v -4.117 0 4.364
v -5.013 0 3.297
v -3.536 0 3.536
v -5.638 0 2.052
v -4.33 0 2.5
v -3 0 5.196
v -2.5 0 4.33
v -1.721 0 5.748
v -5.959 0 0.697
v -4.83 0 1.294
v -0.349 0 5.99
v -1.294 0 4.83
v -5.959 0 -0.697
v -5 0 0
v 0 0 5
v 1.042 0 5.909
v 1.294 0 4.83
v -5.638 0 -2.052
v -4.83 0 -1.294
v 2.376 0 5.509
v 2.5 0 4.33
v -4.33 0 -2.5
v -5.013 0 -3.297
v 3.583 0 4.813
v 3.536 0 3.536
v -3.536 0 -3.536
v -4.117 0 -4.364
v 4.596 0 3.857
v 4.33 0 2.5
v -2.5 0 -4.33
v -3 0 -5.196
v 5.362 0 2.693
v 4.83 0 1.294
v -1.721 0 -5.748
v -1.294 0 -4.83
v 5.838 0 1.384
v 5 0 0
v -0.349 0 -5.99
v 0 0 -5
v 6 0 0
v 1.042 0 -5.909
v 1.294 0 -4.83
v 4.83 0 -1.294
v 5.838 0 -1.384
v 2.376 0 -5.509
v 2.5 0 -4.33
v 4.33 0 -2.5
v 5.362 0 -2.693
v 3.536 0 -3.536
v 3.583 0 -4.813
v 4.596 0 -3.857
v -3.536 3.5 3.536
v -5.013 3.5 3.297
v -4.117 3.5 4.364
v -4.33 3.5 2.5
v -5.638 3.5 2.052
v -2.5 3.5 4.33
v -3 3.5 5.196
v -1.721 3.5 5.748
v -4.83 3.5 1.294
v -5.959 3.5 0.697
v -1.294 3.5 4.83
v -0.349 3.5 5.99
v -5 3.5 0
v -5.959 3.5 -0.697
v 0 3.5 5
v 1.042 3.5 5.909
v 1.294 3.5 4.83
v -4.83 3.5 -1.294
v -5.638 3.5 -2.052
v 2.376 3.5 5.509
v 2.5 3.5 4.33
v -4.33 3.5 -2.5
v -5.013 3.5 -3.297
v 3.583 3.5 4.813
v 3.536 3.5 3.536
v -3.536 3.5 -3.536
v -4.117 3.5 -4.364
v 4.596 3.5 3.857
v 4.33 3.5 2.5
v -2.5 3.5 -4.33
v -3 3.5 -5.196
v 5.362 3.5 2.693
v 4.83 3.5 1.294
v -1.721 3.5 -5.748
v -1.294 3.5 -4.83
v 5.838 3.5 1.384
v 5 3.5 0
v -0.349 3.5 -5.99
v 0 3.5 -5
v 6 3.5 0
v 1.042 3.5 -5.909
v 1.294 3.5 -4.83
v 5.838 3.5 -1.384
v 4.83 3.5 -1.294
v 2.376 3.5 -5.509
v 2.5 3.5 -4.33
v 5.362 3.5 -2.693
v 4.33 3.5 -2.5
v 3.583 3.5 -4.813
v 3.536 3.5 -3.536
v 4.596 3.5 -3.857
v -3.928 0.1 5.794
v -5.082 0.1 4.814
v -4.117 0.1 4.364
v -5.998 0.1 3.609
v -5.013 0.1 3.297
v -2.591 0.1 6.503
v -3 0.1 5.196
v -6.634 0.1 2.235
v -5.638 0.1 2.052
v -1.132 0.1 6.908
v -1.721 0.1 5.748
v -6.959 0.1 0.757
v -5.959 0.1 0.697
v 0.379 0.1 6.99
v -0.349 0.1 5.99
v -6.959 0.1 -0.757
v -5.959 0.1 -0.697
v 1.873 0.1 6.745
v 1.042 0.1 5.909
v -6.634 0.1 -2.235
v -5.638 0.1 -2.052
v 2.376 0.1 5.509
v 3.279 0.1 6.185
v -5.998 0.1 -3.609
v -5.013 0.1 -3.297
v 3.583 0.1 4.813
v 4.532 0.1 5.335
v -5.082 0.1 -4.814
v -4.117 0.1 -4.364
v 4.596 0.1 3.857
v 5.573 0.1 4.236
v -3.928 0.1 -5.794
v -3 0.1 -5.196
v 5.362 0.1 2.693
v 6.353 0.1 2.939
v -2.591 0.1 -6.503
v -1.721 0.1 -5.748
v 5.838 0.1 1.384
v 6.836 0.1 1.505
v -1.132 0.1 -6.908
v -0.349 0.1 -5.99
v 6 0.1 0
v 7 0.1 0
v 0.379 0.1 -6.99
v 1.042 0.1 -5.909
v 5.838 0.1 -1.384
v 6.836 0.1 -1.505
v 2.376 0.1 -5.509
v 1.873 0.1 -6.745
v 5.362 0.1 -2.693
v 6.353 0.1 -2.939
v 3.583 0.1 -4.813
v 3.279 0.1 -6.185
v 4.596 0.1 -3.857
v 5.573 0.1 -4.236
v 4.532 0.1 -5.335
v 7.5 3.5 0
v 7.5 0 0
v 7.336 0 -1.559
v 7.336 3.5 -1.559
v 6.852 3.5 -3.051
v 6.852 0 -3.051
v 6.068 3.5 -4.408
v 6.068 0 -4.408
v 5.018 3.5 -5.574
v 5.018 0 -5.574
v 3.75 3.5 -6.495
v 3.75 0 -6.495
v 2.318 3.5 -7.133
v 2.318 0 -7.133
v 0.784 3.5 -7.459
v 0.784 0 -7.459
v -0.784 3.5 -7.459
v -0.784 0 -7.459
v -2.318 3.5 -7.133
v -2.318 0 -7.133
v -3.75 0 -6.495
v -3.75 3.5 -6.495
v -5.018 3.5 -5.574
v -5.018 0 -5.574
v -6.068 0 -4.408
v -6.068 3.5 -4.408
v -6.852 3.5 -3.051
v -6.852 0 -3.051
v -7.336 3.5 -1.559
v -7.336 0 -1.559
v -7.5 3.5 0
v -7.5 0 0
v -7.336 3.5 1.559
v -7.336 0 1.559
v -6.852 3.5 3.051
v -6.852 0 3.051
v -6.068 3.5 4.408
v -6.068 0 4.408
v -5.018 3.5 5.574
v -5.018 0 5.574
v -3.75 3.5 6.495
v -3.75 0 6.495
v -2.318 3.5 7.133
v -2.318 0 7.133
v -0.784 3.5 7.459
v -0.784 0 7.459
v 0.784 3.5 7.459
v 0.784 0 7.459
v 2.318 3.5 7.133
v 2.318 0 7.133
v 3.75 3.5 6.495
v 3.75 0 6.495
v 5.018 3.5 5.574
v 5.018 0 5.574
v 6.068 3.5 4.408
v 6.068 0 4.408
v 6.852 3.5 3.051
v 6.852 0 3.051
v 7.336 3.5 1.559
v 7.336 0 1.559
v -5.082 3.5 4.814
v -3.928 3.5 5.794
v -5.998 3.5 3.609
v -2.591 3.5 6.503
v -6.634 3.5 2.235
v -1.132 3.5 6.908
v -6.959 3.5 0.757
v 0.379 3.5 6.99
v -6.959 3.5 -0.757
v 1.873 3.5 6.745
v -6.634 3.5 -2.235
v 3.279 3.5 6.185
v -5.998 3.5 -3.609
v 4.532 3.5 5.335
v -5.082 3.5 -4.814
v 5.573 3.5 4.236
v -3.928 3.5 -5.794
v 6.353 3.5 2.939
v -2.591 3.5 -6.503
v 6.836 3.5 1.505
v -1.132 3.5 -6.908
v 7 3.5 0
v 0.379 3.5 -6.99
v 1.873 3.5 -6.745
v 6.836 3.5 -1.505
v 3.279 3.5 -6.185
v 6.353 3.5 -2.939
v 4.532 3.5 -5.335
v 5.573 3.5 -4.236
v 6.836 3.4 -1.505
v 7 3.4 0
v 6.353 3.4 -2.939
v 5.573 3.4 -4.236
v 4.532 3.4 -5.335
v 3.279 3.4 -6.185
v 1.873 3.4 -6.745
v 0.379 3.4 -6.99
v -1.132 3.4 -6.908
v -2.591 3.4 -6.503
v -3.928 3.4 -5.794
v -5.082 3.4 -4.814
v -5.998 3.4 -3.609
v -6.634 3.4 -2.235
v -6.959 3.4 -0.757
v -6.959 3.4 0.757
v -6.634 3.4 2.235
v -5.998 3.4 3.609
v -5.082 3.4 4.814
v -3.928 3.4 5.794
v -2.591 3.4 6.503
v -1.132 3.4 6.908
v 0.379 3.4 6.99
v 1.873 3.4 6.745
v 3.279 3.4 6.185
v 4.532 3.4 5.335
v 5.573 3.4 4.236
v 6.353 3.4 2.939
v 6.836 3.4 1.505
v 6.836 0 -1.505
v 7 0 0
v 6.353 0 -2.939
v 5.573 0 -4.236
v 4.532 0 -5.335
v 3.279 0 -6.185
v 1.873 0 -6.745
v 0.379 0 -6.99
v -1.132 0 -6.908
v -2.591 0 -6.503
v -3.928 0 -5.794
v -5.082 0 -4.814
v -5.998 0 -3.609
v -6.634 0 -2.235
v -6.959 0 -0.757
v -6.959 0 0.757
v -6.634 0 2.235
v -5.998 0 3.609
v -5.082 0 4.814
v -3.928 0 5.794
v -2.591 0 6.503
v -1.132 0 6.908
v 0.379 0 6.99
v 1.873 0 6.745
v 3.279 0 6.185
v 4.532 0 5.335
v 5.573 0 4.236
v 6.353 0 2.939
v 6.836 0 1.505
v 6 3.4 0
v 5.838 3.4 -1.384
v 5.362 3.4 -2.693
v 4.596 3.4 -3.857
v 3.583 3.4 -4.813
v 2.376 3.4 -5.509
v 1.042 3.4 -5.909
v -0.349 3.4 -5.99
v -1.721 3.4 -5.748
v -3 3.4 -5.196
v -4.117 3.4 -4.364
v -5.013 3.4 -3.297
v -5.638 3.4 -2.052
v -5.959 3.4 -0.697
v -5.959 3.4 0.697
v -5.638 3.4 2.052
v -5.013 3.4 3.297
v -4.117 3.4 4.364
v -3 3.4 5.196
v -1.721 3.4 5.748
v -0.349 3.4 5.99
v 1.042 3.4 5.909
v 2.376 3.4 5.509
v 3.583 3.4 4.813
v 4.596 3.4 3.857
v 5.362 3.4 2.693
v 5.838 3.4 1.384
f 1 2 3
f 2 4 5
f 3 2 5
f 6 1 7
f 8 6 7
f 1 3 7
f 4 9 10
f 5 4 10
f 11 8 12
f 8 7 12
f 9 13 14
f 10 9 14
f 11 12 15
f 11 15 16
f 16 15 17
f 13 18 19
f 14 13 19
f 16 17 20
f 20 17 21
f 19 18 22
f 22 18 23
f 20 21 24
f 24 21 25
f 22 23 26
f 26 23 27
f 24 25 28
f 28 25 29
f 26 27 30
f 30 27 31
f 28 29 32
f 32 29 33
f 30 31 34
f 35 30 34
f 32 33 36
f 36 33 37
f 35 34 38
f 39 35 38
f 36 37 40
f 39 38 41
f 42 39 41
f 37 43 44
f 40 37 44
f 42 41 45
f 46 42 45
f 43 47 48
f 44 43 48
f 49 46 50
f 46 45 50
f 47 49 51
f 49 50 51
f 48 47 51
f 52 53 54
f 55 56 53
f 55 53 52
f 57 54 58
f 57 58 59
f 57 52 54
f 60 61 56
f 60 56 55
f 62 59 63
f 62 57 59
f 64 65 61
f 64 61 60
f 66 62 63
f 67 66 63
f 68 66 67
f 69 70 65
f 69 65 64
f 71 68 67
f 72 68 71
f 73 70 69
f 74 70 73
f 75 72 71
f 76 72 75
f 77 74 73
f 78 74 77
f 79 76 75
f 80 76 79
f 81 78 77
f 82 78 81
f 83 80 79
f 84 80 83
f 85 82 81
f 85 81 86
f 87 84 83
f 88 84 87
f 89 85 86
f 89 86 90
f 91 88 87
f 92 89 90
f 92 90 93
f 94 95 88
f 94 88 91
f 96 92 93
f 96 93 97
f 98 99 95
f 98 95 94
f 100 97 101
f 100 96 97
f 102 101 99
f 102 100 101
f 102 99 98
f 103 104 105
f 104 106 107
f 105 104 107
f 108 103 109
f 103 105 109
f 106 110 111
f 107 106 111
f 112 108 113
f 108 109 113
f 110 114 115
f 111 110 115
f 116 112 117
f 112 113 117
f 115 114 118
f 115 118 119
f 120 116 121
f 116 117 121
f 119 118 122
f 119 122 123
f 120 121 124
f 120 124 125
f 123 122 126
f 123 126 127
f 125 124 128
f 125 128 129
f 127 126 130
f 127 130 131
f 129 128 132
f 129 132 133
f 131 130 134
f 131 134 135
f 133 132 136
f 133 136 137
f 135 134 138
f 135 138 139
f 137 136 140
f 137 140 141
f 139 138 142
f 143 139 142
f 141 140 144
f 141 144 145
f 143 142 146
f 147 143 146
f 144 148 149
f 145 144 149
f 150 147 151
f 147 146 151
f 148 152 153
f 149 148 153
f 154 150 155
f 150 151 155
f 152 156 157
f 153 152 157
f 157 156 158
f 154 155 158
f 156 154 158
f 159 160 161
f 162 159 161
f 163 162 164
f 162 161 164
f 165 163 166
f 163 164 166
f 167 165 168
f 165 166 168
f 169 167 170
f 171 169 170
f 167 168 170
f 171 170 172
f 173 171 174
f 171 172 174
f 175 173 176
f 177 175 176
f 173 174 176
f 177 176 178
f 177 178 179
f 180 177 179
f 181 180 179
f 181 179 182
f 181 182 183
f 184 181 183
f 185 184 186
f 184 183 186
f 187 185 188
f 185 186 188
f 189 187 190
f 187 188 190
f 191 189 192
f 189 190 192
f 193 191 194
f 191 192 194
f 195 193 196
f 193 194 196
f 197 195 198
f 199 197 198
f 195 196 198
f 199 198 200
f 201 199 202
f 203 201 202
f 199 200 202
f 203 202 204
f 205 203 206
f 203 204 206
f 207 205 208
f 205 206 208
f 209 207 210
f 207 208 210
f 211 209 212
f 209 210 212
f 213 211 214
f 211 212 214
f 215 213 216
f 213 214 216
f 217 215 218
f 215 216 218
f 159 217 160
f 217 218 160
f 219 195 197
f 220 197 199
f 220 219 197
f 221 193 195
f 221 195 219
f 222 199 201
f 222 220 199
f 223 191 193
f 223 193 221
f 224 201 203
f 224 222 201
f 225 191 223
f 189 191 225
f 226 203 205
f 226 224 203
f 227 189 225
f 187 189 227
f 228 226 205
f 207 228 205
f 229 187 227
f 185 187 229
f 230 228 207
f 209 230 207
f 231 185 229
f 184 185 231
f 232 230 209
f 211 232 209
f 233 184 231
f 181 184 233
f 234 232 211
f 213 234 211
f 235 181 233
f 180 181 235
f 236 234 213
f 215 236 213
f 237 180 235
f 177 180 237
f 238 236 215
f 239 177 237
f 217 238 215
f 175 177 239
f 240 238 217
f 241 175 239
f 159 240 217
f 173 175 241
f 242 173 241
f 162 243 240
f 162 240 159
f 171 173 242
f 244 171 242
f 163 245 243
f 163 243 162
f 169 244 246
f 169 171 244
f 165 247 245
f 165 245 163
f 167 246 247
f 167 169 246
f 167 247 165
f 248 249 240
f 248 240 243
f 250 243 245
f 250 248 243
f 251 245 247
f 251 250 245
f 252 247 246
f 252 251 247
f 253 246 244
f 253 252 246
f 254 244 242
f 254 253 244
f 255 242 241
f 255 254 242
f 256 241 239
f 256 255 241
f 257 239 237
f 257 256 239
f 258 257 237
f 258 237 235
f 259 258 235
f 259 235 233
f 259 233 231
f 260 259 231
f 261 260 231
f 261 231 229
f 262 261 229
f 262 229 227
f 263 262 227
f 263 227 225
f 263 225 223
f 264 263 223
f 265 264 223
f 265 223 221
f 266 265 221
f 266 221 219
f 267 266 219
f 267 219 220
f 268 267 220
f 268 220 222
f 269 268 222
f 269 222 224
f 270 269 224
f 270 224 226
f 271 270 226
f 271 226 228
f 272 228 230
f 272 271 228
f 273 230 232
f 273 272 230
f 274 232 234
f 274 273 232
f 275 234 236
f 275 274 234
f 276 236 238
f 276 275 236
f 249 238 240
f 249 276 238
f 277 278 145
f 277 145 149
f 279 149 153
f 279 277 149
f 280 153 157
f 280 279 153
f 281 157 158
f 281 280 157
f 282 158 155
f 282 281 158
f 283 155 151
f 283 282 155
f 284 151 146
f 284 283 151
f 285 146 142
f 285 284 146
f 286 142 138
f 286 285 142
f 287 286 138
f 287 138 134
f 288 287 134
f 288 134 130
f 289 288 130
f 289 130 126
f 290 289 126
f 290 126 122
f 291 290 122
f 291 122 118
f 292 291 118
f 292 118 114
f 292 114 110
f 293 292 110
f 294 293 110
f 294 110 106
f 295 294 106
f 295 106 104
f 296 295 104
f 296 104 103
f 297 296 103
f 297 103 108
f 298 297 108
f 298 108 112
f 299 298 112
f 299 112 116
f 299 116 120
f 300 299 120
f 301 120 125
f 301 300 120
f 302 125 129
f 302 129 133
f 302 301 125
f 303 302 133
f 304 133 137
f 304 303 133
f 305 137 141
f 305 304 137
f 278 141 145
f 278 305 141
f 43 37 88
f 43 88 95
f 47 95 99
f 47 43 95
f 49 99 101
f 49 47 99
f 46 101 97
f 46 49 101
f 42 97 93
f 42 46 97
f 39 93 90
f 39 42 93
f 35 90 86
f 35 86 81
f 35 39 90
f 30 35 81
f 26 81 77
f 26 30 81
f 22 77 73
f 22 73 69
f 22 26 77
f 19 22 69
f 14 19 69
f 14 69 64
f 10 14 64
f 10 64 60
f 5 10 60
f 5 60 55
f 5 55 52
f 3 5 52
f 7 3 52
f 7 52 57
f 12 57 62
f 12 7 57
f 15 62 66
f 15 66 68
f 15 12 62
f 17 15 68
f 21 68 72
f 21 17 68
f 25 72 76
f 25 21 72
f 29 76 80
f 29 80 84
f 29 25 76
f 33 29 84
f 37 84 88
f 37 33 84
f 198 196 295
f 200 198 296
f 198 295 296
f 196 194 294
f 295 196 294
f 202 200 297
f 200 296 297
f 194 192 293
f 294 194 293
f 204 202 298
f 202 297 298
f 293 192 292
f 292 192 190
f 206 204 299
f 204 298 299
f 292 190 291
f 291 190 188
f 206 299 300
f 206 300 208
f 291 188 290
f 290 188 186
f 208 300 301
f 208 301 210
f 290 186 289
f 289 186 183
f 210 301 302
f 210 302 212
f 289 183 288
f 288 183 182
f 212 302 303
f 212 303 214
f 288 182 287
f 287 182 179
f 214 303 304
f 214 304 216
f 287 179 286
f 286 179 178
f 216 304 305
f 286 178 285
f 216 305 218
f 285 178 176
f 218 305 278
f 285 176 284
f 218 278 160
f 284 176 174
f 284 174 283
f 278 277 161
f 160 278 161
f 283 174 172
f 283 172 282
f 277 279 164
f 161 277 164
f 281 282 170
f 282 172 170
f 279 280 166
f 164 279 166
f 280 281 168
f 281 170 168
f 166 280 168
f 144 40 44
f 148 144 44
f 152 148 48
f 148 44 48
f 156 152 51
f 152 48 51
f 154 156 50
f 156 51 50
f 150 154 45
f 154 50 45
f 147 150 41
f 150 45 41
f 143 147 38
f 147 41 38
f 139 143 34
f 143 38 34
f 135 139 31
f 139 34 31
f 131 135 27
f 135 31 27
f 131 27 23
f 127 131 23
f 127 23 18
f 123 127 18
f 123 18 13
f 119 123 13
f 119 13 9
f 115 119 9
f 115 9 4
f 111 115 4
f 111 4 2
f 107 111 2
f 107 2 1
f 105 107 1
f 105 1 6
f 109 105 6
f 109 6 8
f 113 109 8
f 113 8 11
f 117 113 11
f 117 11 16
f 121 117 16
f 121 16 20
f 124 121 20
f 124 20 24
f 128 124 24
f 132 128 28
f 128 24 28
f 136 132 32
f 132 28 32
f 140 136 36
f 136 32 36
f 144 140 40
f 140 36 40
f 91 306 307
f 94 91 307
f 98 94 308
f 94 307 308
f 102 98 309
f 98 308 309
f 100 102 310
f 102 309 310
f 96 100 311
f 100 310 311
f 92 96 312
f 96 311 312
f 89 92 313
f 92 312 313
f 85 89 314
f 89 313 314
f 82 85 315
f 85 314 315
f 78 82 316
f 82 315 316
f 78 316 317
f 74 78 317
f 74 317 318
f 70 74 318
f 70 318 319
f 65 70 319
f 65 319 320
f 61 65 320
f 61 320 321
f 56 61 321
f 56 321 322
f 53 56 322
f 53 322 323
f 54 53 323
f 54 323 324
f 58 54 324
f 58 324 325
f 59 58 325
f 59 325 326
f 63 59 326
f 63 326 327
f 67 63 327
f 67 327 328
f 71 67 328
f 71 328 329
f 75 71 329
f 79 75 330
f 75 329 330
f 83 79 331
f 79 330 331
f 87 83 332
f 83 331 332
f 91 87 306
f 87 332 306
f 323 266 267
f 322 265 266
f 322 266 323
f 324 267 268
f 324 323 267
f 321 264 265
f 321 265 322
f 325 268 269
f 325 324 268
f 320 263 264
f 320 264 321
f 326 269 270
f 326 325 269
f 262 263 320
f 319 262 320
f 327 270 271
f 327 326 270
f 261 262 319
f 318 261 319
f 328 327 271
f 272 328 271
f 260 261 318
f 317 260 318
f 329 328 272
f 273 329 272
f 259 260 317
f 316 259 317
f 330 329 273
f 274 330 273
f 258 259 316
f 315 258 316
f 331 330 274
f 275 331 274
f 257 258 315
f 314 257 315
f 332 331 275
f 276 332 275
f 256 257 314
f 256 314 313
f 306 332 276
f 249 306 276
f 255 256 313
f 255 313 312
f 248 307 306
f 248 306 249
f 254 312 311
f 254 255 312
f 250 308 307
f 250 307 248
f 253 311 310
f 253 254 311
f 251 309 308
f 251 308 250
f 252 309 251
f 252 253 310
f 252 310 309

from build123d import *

# Parameters (mm, degrees)
SKETCH1_R           = 7.5
SKETCH1_R_2         = 7
BOSS_EXTRUDE1_DEPTH = 3.5
SKETCH6_R           = 7
SKETCH6_R_2         = 6
BOSS_EXTRUDE4_DEPTH = 3.3
SKETCH7_R           = 6
SKETCH7_R_2         = 5
BOSS_EXTRUDE5_DEPTH = 3.5


with BuildPart() as part:
    # Sketch1 → Boss-Extrude1 (new body)
    with BuildSketch(Plane(origin=(0, 0, 0), x_dir=(1, 0, 0), z_dir=(0, 1, 0))):
        Circle(SKETCH1_R)
        Circle(SKETCH1_R_2, mode=Mode.SUBTRACT)
    extrude(amount=BOSS_EXTRUDE1_DEPTH)

    # Sketch6 → Boss-Extrude4 (add)
    with BuildSketch(Plane(origin=(0, 0.1, 0), x_dir=(1, 0, 0), z_dir=(0, 1, 0))):
        Circle(SKETCH6_R)
        Circle(SKETCH6_R_2, mode=Mode.SUBTRACT)
    extrude(amount=BOSS_EXTRUDE4_DEPTH)

    # Sketch7 → Boss-Extrude5 (add)
    with BuildSketch(Plane(origin=(0, 0, 0), x_dir=(1, 0, 0), z_dir=(0, 1, 0))):
        Circle(SKETCH7_R)
        Circle(SKETCH7_R_2, mode=Mode.SUBTRACT)
    extrude(amount=BOSS_EXTRUDE5_DEPTH)


solid = part.part
